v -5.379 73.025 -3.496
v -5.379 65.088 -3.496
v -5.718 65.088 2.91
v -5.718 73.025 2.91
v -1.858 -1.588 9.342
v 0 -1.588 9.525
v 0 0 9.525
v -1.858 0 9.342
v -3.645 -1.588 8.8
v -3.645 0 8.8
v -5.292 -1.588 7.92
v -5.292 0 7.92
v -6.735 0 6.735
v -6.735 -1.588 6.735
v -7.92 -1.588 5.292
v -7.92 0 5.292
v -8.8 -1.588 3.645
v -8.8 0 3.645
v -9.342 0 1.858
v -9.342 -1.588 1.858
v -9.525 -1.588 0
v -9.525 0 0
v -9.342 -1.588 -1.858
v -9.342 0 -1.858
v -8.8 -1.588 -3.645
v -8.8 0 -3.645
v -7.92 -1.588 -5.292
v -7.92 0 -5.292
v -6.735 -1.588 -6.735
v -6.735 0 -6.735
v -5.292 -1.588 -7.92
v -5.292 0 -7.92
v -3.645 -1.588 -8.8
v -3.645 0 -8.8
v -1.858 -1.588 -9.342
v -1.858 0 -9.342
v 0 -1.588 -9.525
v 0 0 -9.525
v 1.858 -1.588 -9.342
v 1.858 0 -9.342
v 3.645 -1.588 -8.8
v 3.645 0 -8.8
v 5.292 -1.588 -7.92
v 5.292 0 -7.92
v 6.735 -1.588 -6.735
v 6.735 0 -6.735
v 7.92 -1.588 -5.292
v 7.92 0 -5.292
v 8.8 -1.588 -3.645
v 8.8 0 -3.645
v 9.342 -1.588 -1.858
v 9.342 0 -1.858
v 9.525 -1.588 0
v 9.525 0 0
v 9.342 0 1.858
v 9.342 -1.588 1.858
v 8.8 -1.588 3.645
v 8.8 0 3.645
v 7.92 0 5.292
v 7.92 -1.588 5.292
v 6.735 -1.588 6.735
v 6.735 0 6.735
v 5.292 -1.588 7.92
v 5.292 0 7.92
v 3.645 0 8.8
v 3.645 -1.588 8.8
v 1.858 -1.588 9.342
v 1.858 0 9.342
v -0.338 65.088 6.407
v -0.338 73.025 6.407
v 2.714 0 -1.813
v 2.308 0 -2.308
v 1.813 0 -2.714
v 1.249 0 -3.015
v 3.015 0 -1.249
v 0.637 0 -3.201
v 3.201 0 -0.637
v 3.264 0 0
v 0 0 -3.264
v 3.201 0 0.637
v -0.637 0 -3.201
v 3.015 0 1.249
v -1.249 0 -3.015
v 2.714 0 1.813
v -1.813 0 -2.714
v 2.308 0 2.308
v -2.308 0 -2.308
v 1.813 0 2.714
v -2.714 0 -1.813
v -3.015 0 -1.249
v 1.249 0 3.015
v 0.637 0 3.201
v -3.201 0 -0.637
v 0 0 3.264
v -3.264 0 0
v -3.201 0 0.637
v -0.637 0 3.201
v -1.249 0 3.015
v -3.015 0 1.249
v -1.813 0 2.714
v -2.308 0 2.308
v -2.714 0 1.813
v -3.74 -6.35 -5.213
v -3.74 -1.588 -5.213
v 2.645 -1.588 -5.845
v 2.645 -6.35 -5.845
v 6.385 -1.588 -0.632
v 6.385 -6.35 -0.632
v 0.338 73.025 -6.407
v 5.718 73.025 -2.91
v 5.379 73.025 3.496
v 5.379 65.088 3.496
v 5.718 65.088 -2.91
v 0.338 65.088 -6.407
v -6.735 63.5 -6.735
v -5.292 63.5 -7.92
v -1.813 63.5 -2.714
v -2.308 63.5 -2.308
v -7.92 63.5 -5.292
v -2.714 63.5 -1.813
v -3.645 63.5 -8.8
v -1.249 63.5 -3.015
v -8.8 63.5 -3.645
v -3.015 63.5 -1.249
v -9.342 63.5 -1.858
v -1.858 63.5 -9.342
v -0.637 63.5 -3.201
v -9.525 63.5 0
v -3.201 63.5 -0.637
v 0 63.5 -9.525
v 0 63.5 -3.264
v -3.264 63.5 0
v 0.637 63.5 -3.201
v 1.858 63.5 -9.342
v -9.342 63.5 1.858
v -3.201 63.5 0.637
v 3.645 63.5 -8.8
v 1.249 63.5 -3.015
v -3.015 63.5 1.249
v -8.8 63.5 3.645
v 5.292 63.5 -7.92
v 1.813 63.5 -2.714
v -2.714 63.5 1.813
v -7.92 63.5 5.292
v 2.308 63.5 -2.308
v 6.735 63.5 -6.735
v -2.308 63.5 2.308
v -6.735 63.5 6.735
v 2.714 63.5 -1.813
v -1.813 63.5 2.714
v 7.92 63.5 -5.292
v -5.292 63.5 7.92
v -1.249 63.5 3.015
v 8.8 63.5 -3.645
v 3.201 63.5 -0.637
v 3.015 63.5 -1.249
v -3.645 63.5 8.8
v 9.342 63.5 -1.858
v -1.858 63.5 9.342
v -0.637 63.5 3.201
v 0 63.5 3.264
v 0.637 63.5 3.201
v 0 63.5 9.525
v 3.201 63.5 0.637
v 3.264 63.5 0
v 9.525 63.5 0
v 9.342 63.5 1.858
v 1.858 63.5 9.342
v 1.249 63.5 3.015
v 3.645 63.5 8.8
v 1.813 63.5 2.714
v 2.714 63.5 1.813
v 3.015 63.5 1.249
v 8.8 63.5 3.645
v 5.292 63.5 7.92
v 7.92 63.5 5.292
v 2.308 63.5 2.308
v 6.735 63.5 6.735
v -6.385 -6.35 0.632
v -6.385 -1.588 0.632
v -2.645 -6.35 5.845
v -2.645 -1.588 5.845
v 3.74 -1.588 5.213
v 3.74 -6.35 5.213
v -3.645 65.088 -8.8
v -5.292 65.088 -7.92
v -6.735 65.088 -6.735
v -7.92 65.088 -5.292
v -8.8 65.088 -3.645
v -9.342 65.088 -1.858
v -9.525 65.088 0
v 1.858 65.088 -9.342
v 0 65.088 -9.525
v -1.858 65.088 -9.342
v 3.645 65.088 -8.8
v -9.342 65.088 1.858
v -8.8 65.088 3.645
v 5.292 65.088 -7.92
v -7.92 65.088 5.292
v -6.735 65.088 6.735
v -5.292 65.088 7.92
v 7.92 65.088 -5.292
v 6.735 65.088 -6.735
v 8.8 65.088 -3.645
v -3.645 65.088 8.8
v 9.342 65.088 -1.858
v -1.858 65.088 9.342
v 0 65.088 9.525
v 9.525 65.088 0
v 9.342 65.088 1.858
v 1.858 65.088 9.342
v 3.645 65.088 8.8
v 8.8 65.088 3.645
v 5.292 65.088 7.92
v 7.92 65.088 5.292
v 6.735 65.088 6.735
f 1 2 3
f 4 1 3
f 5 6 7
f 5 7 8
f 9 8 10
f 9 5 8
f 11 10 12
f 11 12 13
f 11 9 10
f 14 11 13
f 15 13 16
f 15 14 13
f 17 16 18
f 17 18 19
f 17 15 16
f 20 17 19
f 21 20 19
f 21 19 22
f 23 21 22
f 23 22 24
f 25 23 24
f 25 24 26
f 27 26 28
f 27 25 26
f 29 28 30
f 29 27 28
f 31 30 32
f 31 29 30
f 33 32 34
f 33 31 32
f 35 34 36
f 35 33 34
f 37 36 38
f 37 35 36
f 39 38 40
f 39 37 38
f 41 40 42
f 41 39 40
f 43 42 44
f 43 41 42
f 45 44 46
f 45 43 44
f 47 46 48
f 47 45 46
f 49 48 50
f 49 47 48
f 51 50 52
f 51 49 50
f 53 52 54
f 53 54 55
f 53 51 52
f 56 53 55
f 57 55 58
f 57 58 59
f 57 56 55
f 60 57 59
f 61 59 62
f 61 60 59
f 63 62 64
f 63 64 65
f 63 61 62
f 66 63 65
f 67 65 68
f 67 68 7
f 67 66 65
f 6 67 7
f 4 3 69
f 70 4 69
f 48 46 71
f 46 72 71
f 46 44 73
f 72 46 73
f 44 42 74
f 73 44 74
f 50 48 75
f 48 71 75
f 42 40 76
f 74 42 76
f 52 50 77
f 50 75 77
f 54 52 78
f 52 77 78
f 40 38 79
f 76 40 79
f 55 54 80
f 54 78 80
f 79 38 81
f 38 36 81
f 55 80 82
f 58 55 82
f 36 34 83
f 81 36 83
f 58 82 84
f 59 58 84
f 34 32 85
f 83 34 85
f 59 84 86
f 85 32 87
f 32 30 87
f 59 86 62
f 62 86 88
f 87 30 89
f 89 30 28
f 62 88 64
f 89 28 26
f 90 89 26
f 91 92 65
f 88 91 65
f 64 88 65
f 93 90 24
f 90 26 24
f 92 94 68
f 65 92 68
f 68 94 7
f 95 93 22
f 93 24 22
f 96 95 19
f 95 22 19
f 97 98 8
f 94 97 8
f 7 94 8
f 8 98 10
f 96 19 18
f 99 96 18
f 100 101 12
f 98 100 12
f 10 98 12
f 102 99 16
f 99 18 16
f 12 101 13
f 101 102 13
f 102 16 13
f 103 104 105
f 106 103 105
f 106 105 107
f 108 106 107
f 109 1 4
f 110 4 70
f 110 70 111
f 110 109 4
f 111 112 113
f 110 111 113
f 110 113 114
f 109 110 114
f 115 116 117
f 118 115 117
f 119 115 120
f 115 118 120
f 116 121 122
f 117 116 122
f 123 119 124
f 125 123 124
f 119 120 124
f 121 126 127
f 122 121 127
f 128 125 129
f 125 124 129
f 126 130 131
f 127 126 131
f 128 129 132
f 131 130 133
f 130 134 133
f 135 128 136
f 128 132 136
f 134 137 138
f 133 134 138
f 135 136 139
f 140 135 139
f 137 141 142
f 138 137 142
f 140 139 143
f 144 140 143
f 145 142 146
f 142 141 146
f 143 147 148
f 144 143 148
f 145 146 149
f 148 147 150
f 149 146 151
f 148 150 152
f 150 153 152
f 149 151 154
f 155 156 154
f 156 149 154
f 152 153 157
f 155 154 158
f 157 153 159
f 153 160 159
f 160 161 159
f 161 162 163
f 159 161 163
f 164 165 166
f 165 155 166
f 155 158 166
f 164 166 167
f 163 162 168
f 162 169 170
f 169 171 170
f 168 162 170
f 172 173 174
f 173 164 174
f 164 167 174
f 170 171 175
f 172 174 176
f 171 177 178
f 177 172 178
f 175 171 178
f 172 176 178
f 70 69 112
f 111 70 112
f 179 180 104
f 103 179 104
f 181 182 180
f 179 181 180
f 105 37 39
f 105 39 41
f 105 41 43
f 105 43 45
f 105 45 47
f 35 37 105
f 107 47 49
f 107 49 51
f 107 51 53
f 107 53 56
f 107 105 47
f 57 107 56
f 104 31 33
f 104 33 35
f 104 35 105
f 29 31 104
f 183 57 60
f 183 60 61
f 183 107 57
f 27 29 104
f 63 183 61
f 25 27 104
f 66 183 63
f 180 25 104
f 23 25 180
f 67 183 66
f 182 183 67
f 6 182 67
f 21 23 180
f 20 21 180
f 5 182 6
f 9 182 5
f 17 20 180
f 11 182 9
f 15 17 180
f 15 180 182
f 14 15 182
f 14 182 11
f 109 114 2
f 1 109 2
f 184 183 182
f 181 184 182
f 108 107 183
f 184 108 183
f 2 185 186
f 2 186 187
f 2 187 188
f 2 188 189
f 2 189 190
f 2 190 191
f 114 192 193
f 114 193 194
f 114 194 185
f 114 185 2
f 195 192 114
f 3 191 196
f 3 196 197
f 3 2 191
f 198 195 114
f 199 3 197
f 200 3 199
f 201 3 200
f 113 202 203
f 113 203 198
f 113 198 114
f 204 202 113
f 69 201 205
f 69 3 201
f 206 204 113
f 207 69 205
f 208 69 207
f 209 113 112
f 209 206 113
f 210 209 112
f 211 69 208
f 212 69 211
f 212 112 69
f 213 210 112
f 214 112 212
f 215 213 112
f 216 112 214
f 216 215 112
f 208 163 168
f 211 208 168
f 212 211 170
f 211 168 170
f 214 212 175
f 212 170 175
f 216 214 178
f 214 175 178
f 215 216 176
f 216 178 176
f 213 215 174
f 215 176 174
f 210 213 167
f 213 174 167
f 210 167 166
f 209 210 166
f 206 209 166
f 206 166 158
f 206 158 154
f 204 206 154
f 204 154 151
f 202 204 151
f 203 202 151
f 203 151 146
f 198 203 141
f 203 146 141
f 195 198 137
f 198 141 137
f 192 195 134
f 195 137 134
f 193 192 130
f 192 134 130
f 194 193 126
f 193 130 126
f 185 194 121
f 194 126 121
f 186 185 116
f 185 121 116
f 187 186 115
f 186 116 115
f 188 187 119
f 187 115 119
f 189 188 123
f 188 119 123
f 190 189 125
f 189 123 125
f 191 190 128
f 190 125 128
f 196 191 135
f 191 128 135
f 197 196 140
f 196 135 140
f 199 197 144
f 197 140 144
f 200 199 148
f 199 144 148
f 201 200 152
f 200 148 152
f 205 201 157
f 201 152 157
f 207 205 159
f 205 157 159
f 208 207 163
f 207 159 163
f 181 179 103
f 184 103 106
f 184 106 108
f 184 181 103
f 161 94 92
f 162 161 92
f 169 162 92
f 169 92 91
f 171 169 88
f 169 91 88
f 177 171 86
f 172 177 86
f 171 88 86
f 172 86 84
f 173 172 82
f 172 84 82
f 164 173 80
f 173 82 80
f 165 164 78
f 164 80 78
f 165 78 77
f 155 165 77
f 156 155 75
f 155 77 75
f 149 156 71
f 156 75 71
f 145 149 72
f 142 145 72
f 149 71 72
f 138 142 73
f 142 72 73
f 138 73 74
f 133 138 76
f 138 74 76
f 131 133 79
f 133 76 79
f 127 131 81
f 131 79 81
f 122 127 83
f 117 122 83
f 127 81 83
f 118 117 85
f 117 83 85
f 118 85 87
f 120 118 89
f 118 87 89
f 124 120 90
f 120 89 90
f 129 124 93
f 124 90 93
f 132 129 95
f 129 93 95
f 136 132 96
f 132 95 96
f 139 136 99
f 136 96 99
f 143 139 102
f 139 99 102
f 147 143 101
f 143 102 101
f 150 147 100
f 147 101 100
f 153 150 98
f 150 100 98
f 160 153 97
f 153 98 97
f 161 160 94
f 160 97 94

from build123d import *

# Parameters (mm, degrees)
SKETCH1_R           = 3.2639
BOSS_EXTRUDE1_DEPTH = 63.5
SKETCH2_R           = 9.525
BOSS_EXTRUDE2_DEPTH = 1.5875
BOSS_EXTRUDE3_START = 1.5875
SKETCH3_R           = 9.525
BOSS_EXTRUDE3_DEPTH = 1.5875
BOSS_EXTRUDE4_DEPTH = 4.7625
BOSS_EXTRUDE5_DEPTH = 7.9375


with BuildPart() as part:
    # Sketch1 → Boss-Extrude1 (new body)
    with BuildSketch(Plane(origin=(0, 0, 0), x_dir=(1, 0, 0), z_dir=(0, 1, 0))):
        with Locations(Location((0, 0, 0), (0, 0, 270))):
            Circle(SKETCH1_R)
    extrude(amount=BOSS_EXTRUDE1_DEPTH)

    # Sketch2 → Boss-Extrude2 (add)
    with BuildSketch(Plane(origin=(0, 63.5, 0), x_dir=(1, 0, 0), z_dir=(0, 1, 0))):
        with Locations(Location((0, 0, 0), (0, 0, 270))):
            Circle(SKETCH2_R)
    extrude(amount=BOSS_EXTRUDE2_DEPTH)

    # Sketch3 → Boss-Extrude3 (add)
    with BuildSketch(Plane.XZ.offset(BOSS_EXTRUDE3_START)):
        with Locations(Location((0, 0, 0), (0, 0, 90))):
            Circle(SKETCH3_R)
    extrude(amount=-BOSS_EXTRUDE3_DEPTH)

    # Sketch4 → Boss-Extrude4 (add)
    with BuildSketch(Plane.XZ.offset(1.5875)):
        Polygon((3.739867225, 5.213055267), (-2.64470468, 5.845347658), (-6.384571906, 0.63229239), (-3.739867225, -5.213055267), (2.64470468, -5.845347658), (6.384571906, -0.63229239), align=None)
    extrude(amount=BOSS_EXTRUDE4_DEPTH)

    # Sketch5 → Boss-Extrude5 (add)
    with BuildSketch(Plane(origin=(0, 65.0875, 0), x_dir=(1, 0, 0), z_dir=(0, 1, 0))):
        Polygon((5.379355204, -3.496439571), (5.717683093, 2.910438477), (0.33832789, 6.406878048), (-5.379355204, 3.496439571), (-5.717683093, -2.910438477), (-0.33832789, -6.406878048), align=None)
    extrude(amount=BOSS_EXTRUDE5_DEPTH)


solid = part.part
